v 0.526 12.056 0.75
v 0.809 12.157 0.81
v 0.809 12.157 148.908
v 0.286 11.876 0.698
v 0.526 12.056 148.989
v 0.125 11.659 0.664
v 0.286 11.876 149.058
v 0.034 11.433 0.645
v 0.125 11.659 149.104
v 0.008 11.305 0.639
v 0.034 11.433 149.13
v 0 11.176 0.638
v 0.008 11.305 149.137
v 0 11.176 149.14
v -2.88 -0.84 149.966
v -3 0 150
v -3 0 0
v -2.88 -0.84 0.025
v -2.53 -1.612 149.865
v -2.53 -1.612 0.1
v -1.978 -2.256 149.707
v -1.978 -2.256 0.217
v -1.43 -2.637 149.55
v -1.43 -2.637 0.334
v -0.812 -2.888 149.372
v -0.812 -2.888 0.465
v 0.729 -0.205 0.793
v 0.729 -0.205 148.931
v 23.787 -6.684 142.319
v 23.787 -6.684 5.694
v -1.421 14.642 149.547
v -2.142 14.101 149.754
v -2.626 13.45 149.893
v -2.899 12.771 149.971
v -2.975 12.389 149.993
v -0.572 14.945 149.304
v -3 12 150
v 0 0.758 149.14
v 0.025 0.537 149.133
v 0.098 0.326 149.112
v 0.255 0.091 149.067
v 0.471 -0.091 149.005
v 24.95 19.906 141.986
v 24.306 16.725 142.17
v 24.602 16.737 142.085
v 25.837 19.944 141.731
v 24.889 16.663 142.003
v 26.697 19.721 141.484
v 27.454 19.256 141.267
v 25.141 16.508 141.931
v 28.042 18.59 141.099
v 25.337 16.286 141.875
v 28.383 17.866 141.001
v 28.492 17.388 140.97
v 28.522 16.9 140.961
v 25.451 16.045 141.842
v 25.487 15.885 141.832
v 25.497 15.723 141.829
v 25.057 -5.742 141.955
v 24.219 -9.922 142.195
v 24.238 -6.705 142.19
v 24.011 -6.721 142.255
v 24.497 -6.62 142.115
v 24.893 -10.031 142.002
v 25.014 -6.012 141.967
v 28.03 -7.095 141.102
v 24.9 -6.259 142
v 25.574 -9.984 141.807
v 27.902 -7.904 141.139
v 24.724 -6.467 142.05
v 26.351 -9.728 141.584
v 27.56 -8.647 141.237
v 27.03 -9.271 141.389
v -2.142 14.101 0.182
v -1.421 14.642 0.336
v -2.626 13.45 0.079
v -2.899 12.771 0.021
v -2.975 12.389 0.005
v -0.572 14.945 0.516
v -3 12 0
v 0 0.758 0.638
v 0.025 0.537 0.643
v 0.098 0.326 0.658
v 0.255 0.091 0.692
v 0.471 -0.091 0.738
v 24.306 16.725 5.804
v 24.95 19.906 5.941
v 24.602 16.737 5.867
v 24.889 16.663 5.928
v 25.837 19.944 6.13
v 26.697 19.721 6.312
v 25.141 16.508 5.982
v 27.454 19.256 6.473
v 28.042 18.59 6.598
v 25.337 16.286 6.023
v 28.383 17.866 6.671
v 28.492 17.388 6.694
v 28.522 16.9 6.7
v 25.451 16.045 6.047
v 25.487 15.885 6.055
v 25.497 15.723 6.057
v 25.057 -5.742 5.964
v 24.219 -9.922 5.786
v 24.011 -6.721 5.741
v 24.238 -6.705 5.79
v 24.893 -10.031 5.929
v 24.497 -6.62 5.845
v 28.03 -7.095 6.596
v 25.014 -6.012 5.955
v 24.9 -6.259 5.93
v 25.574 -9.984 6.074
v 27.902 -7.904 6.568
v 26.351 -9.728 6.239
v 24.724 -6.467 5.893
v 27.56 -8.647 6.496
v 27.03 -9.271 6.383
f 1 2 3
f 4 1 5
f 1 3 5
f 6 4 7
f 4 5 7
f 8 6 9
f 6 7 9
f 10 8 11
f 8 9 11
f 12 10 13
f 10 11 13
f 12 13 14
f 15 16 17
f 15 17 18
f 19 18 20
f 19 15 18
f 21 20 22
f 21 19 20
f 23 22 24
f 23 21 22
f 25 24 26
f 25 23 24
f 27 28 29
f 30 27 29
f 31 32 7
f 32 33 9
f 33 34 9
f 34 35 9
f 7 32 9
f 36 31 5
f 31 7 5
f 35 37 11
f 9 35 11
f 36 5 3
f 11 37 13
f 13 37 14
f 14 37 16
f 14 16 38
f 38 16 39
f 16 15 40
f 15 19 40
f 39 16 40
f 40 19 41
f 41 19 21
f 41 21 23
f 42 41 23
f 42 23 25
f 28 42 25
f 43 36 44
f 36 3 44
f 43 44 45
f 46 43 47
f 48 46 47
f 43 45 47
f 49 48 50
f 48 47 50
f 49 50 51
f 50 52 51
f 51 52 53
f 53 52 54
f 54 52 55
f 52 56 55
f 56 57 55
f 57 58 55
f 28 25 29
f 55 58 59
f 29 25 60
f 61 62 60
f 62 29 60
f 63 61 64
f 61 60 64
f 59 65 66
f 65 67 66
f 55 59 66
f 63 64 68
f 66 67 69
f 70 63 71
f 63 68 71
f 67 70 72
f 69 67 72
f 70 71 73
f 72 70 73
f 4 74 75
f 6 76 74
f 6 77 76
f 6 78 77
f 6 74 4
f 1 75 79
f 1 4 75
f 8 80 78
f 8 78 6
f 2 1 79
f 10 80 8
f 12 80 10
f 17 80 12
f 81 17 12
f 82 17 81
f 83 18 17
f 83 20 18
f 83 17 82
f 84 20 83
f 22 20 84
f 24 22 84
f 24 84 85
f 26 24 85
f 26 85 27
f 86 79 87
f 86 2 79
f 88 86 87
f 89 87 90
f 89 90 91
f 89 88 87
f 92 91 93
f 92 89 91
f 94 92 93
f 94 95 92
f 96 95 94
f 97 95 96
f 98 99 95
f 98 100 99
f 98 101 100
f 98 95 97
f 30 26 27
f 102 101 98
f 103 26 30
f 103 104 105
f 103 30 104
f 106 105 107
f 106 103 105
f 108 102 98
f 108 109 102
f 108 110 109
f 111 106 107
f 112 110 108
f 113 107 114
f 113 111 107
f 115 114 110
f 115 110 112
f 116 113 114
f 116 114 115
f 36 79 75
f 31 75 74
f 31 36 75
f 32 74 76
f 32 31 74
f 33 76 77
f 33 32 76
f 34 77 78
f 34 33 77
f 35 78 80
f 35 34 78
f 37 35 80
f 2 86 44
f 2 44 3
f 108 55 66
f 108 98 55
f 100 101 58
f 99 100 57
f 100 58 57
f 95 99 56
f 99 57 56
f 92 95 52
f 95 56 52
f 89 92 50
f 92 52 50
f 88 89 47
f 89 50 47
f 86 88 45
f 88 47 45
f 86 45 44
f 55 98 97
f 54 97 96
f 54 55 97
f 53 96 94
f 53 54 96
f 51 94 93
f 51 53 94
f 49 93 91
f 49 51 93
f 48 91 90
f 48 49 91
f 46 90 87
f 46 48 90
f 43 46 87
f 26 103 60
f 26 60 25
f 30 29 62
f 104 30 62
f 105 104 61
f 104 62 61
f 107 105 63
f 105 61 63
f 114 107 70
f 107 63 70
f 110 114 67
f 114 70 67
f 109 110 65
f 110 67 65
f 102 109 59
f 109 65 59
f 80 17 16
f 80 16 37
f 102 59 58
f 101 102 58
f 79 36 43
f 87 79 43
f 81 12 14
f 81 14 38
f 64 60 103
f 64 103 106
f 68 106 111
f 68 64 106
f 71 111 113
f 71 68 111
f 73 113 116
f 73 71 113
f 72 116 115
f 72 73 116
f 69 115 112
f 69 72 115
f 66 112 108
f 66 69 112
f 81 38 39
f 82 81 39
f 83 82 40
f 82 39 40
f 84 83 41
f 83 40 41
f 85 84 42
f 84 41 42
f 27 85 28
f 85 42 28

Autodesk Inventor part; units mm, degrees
ref_plane "YZ Plane" through (0, 0, 0) normal (1, 0, 0) x (0, 1, 0)
ref_plane "XZ Plane" through (0, 0, 0) normal (0, 1, 0) x (-1, 0, 0)
ref_plane "XY Plane" through (0, 0, 0) normal (0, 0, 1) x (1, 0, 0)
sketch "Skizze1" plane through (0, 0, 0) normal (0, 0, 1) x (1, 0, 0)
  line L0 (25.5223, 16.961) -> (0, 12)
  line L1 (0, 12) -> (0, 0)
  line L2 (0, 0) -> (25.0305, -7.0339)
  line L3 (25.0305, -7.0339) -> (25.5223, 16.961)
  line L4 (-3, 14.473) -> (28.5978, 20.615)
  line L5 (28.5978, 20.615) -> (27.9504, -10.9707)
  line L6 (27.9504, -10.9707) -> (-3, -2.2732)
  line L7 (-3, -2.2732) -> (-3, 14.473)
  dimension "d0" = 26
  dimension "d1" = 12
  dimension "d3" = 26
  dimension "d4" = 24
  dimension "d7" = 101
  dimension "d8" = 77.826
  dimension "d9" = 3
  dimension "d10" = 3
  dimension "d11" = 3
  dimension "d12" = 3
extrude "Extrusion1" add sketch "Skizze1" along normal blind 150
sketch "Skizze3" plane through (0, 0, 0) normal (0, 1, 0) x (-1, 0, 0)
  line L0 (3, 0) -> (3, 150) construction
  line L1 (-27.9504, 0) -> (-28.5978, 0) construction
  line L2 (-28.5978, 0) -> (-28.5978, 150) construction
  line L3 (-27.9504, 150) -> (-28.5978, 150) construction
  line L4 (-27.9504, 0) -> (-27.9504, 150) construction
  line L5 (3, 0) -> (-28.5978, 6.7163)
  line L6 (-28.5978, 6.7163) -> (-28.5978, 0)
  line L7 (3, 150) -> (-28.5978, 140.9395)
  line L8 (-28.5978, 150) -> (-28.5978, 140.9395)
  line L9 (3, 150) -> (-27.9504, 150) projected
  line L10 (-28.5978, 150) -> (3, 150)
  line L11 (-27.9504, 0) -> (-28.5978, 0) projected
  line L12 (-28.5978, 0) -> (3, 0)
  point P0 (0, 0)
  dimension "d19" = 78
  dimension "d20" = 74
  dimension "d25" = 150
extrude "Extrusion2" cut sketch "Skizze3" along normal mid plane 149
fillet "Rundung1" radius 3 4 edges at (-3, -2.2732, 75) (27.9504, -10.9707, 73.8519) (-3, 14.473, 75) (28.5978, 20.615, 73.8279)
fillet "Rundung1" radius 1 4 edges at (25.5223, 16.961, 73.942) (25.0305, -7.0339, 73.9602) (0, 0, 74.8887) (0, 12, 74.8887)
equation "\"d10\" = d9"
equation "\"d11\" = d9"
equation "\"d12\" = d9"
properties part number "handle_body_final"
